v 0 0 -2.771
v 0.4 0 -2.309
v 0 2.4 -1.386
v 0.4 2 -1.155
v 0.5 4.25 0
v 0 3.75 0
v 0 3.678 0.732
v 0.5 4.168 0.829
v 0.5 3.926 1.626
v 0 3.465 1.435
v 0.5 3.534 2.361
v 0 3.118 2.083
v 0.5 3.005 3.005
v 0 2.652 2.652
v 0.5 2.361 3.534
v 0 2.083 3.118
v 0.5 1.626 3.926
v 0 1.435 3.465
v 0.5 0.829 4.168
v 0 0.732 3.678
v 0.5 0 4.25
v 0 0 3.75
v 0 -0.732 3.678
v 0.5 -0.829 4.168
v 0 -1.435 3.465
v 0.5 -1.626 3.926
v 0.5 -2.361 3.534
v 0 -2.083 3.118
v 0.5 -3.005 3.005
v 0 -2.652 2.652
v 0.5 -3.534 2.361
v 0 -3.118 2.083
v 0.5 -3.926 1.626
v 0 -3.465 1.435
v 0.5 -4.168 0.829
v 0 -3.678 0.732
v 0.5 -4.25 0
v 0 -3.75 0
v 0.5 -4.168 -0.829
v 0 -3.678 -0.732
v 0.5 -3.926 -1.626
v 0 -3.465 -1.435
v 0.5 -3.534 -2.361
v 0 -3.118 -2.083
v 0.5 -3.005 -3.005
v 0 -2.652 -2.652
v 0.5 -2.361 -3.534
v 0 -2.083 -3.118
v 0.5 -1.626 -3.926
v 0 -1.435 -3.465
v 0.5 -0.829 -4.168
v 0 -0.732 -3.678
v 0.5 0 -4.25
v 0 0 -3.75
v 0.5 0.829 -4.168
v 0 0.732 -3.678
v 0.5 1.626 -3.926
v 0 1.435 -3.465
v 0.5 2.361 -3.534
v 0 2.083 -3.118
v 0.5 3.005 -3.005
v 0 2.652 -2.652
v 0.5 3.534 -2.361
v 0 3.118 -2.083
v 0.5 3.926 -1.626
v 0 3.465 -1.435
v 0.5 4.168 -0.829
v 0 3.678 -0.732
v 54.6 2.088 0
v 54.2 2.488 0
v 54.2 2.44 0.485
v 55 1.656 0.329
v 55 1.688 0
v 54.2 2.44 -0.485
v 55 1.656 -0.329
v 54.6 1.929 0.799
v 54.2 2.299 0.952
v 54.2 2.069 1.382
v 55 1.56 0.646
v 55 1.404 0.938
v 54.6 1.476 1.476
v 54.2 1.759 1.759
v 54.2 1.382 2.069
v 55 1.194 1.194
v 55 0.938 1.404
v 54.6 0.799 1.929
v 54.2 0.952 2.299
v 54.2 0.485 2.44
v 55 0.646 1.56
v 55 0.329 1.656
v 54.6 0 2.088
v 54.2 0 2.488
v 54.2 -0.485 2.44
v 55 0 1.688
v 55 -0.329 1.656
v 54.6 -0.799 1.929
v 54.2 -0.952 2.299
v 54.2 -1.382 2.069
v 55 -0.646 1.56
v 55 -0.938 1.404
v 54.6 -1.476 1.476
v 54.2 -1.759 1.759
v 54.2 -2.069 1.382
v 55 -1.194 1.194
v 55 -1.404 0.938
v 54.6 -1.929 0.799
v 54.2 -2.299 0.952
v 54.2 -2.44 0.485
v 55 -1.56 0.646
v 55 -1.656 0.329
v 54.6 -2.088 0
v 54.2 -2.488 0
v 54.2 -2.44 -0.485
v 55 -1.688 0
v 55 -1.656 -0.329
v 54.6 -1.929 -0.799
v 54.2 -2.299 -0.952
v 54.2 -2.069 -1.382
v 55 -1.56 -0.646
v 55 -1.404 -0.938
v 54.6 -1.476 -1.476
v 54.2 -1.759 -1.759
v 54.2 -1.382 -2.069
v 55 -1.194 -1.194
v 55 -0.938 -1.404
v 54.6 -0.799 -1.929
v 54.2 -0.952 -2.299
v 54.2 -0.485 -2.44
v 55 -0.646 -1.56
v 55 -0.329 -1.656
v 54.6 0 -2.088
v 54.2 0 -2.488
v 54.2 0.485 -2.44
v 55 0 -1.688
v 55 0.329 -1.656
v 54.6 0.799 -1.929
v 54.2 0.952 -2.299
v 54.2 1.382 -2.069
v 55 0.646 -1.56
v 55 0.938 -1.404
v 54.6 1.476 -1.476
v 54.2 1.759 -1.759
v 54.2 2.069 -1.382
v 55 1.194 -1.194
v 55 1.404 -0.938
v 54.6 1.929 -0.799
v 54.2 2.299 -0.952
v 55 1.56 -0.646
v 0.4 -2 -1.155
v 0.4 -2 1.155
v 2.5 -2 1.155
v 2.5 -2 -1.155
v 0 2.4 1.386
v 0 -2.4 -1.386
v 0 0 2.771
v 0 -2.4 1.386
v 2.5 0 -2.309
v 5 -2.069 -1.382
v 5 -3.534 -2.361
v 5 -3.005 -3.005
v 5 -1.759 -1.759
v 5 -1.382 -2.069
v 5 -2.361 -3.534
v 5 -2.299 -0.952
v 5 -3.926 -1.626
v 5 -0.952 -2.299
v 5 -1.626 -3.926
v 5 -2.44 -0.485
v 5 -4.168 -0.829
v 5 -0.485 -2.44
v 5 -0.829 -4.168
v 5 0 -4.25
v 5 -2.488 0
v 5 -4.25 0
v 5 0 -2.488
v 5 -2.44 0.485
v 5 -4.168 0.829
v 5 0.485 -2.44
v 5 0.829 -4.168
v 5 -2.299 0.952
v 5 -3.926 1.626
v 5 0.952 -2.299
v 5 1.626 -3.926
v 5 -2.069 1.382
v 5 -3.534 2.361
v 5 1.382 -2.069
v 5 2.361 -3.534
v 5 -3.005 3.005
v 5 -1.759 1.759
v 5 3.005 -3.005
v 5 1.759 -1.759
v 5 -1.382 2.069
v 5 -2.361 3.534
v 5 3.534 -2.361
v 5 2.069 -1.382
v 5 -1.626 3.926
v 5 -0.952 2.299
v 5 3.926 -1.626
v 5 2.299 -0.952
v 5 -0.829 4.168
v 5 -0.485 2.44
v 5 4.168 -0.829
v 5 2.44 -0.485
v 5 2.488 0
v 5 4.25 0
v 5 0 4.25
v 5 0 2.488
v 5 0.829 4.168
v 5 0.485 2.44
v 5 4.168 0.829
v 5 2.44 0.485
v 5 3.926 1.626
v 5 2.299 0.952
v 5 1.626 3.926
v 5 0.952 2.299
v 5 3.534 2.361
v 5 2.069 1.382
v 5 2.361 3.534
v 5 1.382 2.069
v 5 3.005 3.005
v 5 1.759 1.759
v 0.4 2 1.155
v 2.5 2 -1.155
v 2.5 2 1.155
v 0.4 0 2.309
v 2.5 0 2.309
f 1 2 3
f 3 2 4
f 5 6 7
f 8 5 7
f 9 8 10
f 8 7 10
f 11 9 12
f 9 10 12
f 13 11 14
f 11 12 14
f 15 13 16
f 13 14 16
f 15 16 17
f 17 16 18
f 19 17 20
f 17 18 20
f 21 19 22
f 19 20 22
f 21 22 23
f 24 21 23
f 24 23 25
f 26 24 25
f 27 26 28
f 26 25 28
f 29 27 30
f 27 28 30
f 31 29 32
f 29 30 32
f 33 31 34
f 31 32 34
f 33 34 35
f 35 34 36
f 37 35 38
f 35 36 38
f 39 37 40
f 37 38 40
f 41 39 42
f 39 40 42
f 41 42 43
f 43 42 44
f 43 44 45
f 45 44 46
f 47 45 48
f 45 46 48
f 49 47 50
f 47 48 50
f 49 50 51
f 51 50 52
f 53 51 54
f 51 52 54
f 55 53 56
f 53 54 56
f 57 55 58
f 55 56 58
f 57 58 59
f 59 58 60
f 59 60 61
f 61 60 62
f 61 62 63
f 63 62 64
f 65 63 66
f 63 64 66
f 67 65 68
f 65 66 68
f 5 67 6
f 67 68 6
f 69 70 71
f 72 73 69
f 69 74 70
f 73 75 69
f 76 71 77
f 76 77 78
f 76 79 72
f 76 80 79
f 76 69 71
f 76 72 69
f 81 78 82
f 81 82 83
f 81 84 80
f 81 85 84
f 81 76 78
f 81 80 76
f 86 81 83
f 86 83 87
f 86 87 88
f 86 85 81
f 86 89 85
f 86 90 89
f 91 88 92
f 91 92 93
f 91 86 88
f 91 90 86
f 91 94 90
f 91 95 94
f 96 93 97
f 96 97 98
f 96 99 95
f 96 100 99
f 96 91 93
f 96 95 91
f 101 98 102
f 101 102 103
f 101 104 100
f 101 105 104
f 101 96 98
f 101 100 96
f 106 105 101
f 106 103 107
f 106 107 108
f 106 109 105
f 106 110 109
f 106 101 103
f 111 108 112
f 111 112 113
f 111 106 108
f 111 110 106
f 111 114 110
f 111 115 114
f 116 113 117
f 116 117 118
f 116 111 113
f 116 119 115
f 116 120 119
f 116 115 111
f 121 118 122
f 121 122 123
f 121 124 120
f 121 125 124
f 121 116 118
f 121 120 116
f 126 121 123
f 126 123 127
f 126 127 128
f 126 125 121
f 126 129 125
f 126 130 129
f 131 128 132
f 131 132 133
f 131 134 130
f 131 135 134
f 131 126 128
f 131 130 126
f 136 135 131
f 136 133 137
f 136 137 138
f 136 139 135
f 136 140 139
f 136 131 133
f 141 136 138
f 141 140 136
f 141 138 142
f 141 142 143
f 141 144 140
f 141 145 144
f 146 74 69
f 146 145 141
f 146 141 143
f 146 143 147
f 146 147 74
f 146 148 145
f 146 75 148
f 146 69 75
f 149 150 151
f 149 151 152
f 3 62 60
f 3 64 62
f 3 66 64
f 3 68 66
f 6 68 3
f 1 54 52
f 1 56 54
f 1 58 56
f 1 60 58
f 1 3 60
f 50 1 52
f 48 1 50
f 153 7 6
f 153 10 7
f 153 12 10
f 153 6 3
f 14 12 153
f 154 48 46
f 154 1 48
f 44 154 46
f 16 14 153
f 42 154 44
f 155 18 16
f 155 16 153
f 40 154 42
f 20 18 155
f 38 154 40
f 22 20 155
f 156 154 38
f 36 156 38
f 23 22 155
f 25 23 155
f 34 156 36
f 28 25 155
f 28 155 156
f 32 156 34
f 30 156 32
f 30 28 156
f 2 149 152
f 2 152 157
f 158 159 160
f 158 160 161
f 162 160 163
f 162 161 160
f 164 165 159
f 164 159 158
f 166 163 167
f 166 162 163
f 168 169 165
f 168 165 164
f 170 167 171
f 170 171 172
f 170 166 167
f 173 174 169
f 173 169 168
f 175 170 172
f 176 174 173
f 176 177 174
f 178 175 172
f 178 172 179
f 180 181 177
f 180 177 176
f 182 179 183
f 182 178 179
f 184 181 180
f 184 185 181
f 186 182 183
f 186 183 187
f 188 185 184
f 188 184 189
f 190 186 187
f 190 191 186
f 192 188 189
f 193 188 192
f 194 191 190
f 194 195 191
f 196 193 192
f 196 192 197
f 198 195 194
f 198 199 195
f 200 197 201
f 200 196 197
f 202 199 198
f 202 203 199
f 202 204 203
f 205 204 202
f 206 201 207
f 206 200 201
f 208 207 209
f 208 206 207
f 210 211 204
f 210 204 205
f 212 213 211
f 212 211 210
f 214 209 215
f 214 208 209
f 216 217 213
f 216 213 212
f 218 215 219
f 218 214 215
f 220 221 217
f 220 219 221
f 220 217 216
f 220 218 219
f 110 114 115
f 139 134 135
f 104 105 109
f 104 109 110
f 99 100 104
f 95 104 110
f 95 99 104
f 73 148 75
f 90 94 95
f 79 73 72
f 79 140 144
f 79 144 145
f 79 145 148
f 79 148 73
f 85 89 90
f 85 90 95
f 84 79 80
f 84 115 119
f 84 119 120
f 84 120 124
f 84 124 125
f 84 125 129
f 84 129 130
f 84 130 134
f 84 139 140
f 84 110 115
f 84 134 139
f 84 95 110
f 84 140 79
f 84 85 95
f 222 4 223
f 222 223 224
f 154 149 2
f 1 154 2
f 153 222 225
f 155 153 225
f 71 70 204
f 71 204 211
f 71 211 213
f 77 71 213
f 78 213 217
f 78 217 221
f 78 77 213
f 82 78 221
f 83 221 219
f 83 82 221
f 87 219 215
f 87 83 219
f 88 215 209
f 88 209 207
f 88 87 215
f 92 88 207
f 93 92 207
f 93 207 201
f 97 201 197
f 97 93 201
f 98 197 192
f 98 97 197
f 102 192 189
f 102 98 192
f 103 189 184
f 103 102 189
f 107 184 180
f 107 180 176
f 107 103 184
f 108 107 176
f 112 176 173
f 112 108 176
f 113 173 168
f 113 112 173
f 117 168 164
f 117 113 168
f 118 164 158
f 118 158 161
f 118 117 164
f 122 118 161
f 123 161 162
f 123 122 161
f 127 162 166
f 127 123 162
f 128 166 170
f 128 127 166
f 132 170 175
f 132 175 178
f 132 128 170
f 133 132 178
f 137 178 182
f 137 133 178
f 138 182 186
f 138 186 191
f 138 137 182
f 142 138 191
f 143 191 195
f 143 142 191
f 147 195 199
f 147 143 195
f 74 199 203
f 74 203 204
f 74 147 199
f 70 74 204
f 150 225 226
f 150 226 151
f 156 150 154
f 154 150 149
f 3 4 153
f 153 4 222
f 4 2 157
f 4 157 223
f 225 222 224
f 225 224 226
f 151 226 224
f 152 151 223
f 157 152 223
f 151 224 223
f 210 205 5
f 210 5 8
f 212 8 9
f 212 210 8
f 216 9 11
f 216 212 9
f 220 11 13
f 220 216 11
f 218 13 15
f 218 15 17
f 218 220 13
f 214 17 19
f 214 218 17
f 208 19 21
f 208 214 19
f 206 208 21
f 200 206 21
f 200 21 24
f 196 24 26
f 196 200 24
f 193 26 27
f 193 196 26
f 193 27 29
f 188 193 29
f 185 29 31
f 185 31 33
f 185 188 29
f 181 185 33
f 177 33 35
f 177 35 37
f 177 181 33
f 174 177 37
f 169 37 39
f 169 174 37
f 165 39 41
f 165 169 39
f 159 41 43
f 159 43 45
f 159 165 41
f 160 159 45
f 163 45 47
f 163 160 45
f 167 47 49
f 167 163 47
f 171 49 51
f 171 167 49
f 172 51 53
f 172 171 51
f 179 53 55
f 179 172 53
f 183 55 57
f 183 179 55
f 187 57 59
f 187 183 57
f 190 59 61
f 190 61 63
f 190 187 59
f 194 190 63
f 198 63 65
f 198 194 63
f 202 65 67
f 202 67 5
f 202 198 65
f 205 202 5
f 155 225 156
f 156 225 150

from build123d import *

# Parameters (mm, degrees)
CHAMFER1_SIZE      = 0.8
CHAMFER2_SIZE      = 0.5
CUT_EXTRUDE1_DEPTH = 2.5
CHAMFER3_SIZE      = 0.4


with BuildPart() as part:
    # Sketch1 → Revolve1 (revolve)
    with BuildSketch(Plane.XY):
        Polygon((0, 0), (0, 4.25), (5, 4.25), (5, 2.488), (55, 2.488), (55, 0), align=None)
    revolve(axis=Axis((-88.705490849, 0, 0), (1, 0, 0)))

    # Chamfer1
    chamfer1_edges = [part.edges().sort_by_distance(p)[0] for p in [
        (55, -2.488, 0),
    ]]
    chamfer(chamfer1_edges, length=CHAMFER1_SIZE)

    # Chamfer2
    chamfer2_edges = [part.edges().sort_by_distance(p)[0] for p in [
        (0, -4.25, 0),
    ]]
    chamfer(chamfer2_edges, length=CHAMFER2_SIZE)

    # Sketch3 → Cut-Extrude1 (cut)
    with BuildSketch(Plane(origin=(0, 0, 0), x_dir=(0, 0, -1), z_dir=(1, 0, 0))):
        Polygon((-2.309401077, 0), (-1.154700538, -2), (1.154700538, -2), (2.309401077, 0), (1.154700538, 2), (-1.154700538, 2), align=None)
    extrude(amount=CUT_EXTRUDE1_DEPTH, mode=Mode.SUBTRACT)

    # Chamfer3
    chamfer3_edges = [part.edges().sort_by_distance(p)[0] for p in [
        (0, 1, 1.732050808),
        (0, -1, 1.732050808),
        (0, -2, 0),
        (0, -1, -1.732050808),
        (0, 1, -1.732050808),
        (0, 2, 0),
    ]]
    chamfer(chamfer3_edges, length=CHAMFER3_SIZE)


solid = part.part
